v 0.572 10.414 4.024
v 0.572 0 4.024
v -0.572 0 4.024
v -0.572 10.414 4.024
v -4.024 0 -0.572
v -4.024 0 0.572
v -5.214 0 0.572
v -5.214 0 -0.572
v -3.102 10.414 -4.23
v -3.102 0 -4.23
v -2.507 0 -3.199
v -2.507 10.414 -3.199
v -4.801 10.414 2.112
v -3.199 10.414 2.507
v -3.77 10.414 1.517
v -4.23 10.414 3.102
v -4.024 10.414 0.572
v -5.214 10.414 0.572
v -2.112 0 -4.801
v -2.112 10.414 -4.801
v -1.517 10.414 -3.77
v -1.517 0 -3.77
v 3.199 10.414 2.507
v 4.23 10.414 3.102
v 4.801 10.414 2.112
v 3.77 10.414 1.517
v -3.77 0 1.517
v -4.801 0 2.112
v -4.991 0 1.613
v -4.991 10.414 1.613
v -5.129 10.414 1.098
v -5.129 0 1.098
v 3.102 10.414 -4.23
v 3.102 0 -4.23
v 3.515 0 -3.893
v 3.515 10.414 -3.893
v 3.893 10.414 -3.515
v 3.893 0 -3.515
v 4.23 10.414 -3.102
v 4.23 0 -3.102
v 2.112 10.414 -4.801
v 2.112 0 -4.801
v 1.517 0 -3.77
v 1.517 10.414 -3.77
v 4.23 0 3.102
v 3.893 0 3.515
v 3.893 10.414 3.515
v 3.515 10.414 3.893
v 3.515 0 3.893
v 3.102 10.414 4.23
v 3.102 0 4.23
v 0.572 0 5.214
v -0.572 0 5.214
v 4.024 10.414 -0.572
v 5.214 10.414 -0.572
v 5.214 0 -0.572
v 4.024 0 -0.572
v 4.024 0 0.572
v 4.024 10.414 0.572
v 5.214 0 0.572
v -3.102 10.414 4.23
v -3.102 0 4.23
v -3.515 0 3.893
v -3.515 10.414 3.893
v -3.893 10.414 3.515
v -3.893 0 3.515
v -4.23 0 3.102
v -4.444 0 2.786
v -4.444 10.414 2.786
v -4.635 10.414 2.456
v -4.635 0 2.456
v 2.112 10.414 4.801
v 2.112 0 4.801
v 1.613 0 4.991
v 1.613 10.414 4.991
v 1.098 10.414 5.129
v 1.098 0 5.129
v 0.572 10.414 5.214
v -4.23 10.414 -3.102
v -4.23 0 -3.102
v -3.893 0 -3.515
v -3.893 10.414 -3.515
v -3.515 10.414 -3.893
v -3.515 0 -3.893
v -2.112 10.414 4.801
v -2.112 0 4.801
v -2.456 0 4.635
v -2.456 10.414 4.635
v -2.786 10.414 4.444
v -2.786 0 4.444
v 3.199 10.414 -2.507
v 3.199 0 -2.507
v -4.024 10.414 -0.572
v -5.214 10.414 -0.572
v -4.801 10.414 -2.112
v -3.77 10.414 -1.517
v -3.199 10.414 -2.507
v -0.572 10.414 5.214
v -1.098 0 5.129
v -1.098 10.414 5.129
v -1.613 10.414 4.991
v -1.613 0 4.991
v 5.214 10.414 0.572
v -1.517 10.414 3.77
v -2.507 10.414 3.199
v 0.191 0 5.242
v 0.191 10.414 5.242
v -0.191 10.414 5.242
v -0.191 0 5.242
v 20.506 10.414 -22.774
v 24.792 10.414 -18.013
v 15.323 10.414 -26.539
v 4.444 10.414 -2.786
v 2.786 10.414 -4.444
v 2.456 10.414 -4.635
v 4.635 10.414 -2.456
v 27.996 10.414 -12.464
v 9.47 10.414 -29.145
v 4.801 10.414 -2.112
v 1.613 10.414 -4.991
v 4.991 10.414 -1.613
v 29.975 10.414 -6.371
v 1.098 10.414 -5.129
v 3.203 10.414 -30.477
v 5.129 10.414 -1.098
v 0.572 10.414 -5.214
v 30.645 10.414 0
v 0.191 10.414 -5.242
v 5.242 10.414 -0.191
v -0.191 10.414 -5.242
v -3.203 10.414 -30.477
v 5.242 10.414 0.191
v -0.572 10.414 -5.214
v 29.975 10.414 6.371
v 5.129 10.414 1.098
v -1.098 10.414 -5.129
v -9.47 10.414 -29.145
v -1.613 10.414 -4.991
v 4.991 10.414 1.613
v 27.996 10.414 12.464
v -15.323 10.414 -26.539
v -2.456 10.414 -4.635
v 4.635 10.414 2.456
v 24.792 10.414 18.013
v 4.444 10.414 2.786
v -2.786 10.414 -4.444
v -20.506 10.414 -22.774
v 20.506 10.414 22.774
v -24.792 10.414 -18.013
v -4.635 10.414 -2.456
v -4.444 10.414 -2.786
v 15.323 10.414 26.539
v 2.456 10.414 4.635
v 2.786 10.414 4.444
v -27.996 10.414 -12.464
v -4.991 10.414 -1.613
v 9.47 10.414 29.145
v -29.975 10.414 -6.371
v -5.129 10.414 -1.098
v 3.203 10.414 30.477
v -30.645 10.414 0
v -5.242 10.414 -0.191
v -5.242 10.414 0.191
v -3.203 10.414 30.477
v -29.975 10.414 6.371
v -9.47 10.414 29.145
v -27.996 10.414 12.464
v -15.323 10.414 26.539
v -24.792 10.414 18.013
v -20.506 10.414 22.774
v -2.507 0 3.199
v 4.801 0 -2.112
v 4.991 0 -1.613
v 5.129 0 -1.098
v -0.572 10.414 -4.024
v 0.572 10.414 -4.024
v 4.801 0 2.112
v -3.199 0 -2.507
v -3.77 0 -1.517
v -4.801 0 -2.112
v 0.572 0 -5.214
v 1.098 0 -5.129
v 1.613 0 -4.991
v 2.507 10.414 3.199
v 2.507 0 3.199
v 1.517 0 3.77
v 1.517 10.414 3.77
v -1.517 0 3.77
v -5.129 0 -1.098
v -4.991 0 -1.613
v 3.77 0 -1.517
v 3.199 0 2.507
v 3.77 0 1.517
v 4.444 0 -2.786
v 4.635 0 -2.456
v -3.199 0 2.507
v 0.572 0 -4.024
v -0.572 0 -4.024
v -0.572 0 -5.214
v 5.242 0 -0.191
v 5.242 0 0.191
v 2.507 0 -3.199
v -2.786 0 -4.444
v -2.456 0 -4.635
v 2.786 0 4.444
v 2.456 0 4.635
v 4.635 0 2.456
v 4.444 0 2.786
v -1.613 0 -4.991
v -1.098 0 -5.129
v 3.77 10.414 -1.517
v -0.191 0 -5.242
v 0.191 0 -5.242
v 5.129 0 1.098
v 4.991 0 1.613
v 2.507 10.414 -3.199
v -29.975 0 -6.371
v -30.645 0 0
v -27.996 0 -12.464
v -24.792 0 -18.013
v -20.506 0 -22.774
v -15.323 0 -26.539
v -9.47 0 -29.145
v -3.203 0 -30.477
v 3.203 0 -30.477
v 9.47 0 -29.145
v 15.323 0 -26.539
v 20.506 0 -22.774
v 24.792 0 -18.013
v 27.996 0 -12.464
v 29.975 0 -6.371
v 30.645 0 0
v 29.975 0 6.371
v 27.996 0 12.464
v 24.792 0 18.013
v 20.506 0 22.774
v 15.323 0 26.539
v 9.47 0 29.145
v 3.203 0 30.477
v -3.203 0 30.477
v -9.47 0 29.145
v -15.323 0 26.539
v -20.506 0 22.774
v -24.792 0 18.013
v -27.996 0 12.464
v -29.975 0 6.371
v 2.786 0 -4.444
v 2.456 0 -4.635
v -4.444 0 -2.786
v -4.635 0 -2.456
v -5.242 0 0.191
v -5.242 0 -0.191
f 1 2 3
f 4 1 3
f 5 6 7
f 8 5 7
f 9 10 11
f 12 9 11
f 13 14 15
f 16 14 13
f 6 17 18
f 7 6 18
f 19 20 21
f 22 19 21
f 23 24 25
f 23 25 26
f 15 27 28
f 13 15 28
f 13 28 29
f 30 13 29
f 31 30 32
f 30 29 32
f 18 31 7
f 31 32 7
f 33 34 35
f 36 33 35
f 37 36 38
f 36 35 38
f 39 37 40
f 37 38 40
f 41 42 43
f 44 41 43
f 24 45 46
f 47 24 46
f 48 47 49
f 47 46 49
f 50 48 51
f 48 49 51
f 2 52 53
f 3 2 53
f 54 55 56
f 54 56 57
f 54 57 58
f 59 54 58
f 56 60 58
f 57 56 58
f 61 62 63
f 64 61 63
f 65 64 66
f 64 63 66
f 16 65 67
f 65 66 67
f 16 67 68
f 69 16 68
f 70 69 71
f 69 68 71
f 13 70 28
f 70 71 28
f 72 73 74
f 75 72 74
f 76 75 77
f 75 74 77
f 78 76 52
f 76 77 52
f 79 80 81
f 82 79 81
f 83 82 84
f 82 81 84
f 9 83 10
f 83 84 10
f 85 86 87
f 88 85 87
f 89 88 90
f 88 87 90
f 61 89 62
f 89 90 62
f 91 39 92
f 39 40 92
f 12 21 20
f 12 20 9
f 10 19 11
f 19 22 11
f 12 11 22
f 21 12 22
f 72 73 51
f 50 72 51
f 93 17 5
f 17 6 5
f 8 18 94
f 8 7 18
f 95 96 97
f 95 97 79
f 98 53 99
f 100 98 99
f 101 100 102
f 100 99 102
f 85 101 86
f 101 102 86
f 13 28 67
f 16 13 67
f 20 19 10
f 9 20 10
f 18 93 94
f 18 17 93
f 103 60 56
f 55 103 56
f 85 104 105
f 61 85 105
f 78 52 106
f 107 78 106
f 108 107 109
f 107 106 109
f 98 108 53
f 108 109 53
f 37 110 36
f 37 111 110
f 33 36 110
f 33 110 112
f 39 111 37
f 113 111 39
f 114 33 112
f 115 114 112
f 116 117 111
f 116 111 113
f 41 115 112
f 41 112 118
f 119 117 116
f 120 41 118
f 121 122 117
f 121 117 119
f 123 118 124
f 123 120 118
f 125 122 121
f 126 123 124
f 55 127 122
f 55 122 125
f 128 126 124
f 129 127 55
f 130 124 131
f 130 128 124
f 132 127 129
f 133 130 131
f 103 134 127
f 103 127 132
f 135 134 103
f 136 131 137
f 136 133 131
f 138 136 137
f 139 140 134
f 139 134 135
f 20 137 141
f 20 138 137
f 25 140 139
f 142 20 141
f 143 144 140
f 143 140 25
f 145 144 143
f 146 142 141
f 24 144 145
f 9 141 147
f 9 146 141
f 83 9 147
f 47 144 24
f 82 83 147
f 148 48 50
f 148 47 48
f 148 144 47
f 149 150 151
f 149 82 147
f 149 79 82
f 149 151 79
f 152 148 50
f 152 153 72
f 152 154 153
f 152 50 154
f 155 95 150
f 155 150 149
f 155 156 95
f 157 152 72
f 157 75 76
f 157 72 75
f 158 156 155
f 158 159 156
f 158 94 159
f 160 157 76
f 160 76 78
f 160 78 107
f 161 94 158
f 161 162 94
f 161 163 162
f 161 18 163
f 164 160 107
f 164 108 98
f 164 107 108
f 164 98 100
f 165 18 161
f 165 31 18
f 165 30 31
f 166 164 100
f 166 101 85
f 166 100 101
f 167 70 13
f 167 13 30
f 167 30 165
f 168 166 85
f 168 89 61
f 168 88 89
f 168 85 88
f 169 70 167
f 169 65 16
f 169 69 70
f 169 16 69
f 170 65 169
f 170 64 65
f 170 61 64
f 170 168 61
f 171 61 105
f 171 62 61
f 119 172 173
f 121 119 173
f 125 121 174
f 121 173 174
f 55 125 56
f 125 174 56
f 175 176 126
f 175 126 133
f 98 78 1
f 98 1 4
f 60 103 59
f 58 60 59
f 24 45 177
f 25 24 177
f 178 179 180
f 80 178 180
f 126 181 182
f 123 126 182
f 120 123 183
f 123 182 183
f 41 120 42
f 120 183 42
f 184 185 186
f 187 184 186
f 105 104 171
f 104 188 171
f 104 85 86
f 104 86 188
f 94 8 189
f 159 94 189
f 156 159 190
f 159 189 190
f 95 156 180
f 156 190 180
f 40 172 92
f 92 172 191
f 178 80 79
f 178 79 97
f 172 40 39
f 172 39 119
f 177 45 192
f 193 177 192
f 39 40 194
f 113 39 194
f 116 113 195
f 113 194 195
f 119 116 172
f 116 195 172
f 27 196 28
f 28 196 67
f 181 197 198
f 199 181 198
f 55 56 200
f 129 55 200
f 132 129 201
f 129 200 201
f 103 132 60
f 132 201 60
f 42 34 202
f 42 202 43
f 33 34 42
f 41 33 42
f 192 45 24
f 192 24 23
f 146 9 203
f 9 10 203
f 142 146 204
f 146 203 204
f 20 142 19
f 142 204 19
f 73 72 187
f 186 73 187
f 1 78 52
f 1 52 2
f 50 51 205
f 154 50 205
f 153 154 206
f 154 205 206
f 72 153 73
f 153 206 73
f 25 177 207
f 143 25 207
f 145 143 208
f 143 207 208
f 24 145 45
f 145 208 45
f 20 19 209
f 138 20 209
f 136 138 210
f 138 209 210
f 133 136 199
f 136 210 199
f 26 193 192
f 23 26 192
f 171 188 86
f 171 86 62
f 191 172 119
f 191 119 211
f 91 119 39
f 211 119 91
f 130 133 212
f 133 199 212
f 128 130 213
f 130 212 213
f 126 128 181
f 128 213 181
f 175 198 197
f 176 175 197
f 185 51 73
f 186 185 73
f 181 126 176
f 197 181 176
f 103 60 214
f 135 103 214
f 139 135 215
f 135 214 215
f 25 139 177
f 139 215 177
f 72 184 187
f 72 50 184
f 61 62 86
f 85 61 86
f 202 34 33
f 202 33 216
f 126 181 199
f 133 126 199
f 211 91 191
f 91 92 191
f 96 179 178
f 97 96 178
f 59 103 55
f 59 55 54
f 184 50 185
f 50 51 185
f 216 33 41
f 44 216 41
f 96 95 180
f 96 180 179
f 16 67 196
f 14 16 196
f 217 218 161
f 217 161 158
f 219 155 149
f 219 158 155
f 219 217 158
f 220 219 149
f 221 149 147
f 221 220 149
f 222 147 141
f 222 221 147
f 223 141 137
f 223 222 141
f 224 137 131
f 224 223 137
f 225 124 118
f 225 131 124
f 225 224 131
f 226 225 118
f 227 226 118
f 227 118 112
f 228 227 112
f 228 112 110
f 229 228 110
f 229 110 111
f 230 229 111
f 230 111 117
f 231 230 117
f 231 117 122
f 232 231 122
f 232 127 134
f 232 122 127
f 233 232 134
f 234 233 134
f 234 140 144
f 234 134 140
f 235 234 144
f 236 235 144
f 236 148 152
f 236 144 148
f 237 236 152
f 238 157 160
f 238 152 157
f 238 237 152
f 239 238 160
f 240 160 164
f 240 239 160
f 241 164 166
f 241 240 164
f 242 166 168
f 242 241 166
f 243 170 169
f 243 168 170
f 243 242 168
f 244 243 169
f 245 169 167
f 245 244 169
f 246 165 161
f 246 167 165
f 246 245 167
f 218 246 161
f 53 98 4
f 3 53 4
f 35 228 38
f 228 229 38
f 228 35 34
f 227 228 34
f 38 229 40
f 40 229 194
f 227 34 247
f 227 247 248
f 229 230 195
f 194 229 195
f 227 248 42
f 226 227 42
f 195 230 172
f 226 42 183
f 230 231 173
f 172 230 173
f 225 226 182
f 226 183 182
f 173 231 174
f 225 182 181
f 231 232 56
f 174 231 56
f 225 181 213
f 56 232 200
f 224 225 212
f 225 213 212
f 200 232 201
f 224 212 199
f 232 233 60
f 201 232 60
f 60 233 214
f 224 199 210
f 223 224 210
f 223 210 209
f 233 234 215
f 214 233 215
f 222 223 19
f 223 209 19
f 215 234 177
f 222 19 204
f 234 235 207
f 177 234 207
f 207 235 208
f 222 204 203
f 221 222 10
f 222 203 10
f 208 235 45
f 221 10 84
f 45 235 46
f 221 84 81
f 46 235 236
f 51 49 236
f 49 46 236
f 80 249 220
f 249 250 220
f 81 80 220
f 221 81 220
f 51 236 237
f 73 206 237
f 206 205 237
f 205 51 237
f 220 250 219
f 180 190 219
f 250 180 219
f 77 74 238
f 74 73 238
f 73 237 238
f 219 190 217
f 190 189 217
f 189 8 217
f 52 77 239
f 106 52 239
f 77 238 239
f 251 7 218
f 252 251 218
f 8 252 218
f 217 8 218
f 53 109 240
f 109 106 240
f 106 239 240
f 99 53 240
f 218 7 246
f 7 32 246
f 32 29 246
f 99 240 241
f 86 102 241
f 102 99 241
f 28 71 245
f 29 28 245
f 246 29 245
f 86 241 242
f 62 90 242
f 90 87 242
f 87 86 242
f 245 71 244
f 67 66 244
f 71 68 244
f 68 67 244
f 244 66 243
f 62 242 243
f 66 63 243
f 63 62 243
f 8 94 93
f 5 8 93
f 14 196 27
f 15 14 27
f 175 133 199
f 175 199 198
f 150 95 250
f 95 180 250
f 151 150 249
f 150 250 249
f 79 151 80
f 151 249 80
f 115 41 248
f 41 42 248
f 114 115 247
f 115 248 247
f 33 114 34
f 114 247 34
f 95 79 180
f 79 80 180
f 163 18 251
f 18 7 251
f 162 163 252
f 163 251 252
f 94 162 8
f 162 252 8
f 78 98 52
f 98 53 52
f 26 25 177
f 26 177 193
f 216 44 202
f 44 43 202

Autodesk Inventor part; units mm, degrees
ref_plane "YZ Plane" through (0, 0, 0) normal (1, 0, 0) x (0, 1, 0)
ref_plane "XZ Plane" through (0, 0, 0) normal (0, 1, 0) x (-1, 0, 0)
ref_plane "XY Plane" through (0, 0, 0) normal (0, 0, 1) x (1, 0, 0)
sketch "Sketch1" plane through (0, 0, 0) normal (0, 1, 0) x (-1, 0, 0)
  circle A0 centre (0, 0) radius 5.2451
  circle A1 centre (0, 0) radius 4.064 construction
  line L0 (4.0236, 0.5715) -> (5.2139, 0.5715)
  line L1 (5.2139, -0.5715) -> (4.0236, -0.5715)
  line L2 (3.7703, 1.5169) -> (4.8011, 2.112)
  line L3 (4.2296, 3.1019) -> (3.1988, 2.5067)
  line L4 (3.1019, 4.2296) -> (2.5067, 3.1988)
  line L5 (2.112, 4.8011) -> (1.5169, 3.7703)
  line L6 (-0.5715, 5.2139) -> (-0.5715, 4.0236)
  line L7 (-2.112, 4.8011) -> (-1.5169, 3.7703)
  line L8 (-3.1019, 4.2296) -> (-2.5067, 3.1988)
  line L9 (-4.8011, 2.112) -> (-3.7703, 1.5169)
  line L10 (-4.2296, 3.1019) -> (-3.1988, 2.5067)
  line L11 (-5.2139, 0.5715) -> (-4.0236, 0.5715)
  line L12 (-5.2139, -0.5715) -> (-4.0236, -0.5715)
  line L13 (-4.8011, -2.112) -> (-3.7703, -1.5169)
  line L14 (-4.2296, -3.1019) -> (-3.1988, -2.5067)
  line L15 (-3.1019, -4.2296) -> (-2.5067, -3.1988)
  line L16 (-2.112, -4.8011) -> (-1.5169, -3.7703)
  line L17 (-0.5715, -5.2139) -> (-0.5715, -4.0236)
  line L18 (0.5715, -5.2139) -> (0.5715, -4.0236)
  line L19 (3.1019, -4.2296) -> (2.5067, -3.1988)
  line L20 (2.112, -4.8011) -> (1.5169, -3.7703)
  line L21 (4.2296, -3.1019) -> (3.1988, -2.5067)
  line L22 (4.8011, -2.112) -> (3.7703, -1.5169)
  line L23 (0.5715, 5.2139) -> (0.5715, 4.0236)
  circle A2 centre (0, 0) radius 30.6451
  circle A3 centre (0, 0) radius 4.064
  line L24 (5.2139, 0.5715) -> (5.2139, -0.5715)
  line L25 (4.0236, 0.5715) -> (4.0236, -0.5715)
  line L26 (3.7703, -1.5169) -> (3.1988, -2.5067)
  line L27 (2.5067, -3.1988) -> (1.5169, -3.7703)
  line L28 (0.5715, -4.0236) -> (-0.5715, -4.0236)
  line L29 (-1.5169, -3.7703) -> (-2.5067, -3.1988)
  line L30 (-3.1988, -2.5067) -> (-3.7703, -1.5169)
  line L31 (-4.0236, -0.5715) -> (-4.0236, 0.5715)
  line L32 (-3.7703, 1.5169) -> (-3.1988, 2.5067)
  line L33 (-2.5067, 3.1988) -> (-1.5169, 3.7703)
  line L34 (-0.5715, 4.0236) -> (0.5715, 4.0236)
  line L35 (1.5169, 3.7703) -> (2.5067, 3.1988)
  line L36 (3.1988, 2.5067) -> (3.7703, 1.5169)
  line L37 (3.7703, 1.5169) -> (4.8011, 2.112)
  line L38 (4.8011, 2.112) -> (4.2296, 3.1019)
  line L39 (3.1019, 4.2296) -> (2.112, 4.8011)
  line L40 (0.5715, 5.2139) -> (-0.5715, 5.2139)
  line L41 (-2.112, 4.8011) -> (-3.1019, 4.2296)
  line L42 (-4.2296, 3.1019) -> (-4.8011, 2.112)
  line L43 (-5.2139, 0.5715) -> (-5.2139, -0.5715)
  line L44 (-3.1019, -4.2296) -> (-2.112, -4.8011)
  line L45 (-4.2296, -3.1019) -> (-4.8011, -2.112)
  line L46 (-0.5715, -5.2139) -> (0.5715, -5.2139)
  line L47 (2.112, -4.8011) -> (3.1019, -4.2296)
  line L48 (4.2296, -3.1019) -> (4.8011, -2.112)
  dimension "d0" = 10.4902
  dimension "d1" = 8.128
  dimension "d4" = 1.143
  dimension "d5" = 1.143
  dimension "d6" = 1.143
  dimension "d7" = 1.143
  dimension "d8" = 1.143
  dimension "d9" = 1.143
  dimension "d11" = 1.143
  dimension "d12" = 30
  dimension "d15" = 30
  dimension "d18" = 30
  dimension "d20" = 1.143
  dimension "d21" = 30
  dimension "d22" = 30
  dimension "d23" = 30
  dimension "d28" = 1.143
  dimension "d29" = 30
  dimension "d30" = 30
  dimension "d31" = 1.143
  dimension "d32" = 30
  dimension "d34" = 1.143
  dimension "d35" = 25.4
extrude "Extrusion1" add sketch "Sketch1" along normal blind 10.414 contours L24 L1 A3 L0 | L2 A3 L3 L38 | A3 L25 | L48 L21 A3 L22 | L36 A3 | A3 L26 | L4 A3 L5 L39 | L47 L20 A3 L19 | L35 A3 | A3 L27 | L23 A3 L6 L40 | L46 L17 A3 L18 | L34 A3 | A3 L28 | L7 A3 L8 L41 | L44 L15 A3 L16 | L33 A3 | A3 L29 | L10 A3 L9 L42 | L45 L13 A3 L14 | L32 A3 | A3 L30 | L11 A3 L12 L43 | L31 A3 | A2
properties part number "Protector"
